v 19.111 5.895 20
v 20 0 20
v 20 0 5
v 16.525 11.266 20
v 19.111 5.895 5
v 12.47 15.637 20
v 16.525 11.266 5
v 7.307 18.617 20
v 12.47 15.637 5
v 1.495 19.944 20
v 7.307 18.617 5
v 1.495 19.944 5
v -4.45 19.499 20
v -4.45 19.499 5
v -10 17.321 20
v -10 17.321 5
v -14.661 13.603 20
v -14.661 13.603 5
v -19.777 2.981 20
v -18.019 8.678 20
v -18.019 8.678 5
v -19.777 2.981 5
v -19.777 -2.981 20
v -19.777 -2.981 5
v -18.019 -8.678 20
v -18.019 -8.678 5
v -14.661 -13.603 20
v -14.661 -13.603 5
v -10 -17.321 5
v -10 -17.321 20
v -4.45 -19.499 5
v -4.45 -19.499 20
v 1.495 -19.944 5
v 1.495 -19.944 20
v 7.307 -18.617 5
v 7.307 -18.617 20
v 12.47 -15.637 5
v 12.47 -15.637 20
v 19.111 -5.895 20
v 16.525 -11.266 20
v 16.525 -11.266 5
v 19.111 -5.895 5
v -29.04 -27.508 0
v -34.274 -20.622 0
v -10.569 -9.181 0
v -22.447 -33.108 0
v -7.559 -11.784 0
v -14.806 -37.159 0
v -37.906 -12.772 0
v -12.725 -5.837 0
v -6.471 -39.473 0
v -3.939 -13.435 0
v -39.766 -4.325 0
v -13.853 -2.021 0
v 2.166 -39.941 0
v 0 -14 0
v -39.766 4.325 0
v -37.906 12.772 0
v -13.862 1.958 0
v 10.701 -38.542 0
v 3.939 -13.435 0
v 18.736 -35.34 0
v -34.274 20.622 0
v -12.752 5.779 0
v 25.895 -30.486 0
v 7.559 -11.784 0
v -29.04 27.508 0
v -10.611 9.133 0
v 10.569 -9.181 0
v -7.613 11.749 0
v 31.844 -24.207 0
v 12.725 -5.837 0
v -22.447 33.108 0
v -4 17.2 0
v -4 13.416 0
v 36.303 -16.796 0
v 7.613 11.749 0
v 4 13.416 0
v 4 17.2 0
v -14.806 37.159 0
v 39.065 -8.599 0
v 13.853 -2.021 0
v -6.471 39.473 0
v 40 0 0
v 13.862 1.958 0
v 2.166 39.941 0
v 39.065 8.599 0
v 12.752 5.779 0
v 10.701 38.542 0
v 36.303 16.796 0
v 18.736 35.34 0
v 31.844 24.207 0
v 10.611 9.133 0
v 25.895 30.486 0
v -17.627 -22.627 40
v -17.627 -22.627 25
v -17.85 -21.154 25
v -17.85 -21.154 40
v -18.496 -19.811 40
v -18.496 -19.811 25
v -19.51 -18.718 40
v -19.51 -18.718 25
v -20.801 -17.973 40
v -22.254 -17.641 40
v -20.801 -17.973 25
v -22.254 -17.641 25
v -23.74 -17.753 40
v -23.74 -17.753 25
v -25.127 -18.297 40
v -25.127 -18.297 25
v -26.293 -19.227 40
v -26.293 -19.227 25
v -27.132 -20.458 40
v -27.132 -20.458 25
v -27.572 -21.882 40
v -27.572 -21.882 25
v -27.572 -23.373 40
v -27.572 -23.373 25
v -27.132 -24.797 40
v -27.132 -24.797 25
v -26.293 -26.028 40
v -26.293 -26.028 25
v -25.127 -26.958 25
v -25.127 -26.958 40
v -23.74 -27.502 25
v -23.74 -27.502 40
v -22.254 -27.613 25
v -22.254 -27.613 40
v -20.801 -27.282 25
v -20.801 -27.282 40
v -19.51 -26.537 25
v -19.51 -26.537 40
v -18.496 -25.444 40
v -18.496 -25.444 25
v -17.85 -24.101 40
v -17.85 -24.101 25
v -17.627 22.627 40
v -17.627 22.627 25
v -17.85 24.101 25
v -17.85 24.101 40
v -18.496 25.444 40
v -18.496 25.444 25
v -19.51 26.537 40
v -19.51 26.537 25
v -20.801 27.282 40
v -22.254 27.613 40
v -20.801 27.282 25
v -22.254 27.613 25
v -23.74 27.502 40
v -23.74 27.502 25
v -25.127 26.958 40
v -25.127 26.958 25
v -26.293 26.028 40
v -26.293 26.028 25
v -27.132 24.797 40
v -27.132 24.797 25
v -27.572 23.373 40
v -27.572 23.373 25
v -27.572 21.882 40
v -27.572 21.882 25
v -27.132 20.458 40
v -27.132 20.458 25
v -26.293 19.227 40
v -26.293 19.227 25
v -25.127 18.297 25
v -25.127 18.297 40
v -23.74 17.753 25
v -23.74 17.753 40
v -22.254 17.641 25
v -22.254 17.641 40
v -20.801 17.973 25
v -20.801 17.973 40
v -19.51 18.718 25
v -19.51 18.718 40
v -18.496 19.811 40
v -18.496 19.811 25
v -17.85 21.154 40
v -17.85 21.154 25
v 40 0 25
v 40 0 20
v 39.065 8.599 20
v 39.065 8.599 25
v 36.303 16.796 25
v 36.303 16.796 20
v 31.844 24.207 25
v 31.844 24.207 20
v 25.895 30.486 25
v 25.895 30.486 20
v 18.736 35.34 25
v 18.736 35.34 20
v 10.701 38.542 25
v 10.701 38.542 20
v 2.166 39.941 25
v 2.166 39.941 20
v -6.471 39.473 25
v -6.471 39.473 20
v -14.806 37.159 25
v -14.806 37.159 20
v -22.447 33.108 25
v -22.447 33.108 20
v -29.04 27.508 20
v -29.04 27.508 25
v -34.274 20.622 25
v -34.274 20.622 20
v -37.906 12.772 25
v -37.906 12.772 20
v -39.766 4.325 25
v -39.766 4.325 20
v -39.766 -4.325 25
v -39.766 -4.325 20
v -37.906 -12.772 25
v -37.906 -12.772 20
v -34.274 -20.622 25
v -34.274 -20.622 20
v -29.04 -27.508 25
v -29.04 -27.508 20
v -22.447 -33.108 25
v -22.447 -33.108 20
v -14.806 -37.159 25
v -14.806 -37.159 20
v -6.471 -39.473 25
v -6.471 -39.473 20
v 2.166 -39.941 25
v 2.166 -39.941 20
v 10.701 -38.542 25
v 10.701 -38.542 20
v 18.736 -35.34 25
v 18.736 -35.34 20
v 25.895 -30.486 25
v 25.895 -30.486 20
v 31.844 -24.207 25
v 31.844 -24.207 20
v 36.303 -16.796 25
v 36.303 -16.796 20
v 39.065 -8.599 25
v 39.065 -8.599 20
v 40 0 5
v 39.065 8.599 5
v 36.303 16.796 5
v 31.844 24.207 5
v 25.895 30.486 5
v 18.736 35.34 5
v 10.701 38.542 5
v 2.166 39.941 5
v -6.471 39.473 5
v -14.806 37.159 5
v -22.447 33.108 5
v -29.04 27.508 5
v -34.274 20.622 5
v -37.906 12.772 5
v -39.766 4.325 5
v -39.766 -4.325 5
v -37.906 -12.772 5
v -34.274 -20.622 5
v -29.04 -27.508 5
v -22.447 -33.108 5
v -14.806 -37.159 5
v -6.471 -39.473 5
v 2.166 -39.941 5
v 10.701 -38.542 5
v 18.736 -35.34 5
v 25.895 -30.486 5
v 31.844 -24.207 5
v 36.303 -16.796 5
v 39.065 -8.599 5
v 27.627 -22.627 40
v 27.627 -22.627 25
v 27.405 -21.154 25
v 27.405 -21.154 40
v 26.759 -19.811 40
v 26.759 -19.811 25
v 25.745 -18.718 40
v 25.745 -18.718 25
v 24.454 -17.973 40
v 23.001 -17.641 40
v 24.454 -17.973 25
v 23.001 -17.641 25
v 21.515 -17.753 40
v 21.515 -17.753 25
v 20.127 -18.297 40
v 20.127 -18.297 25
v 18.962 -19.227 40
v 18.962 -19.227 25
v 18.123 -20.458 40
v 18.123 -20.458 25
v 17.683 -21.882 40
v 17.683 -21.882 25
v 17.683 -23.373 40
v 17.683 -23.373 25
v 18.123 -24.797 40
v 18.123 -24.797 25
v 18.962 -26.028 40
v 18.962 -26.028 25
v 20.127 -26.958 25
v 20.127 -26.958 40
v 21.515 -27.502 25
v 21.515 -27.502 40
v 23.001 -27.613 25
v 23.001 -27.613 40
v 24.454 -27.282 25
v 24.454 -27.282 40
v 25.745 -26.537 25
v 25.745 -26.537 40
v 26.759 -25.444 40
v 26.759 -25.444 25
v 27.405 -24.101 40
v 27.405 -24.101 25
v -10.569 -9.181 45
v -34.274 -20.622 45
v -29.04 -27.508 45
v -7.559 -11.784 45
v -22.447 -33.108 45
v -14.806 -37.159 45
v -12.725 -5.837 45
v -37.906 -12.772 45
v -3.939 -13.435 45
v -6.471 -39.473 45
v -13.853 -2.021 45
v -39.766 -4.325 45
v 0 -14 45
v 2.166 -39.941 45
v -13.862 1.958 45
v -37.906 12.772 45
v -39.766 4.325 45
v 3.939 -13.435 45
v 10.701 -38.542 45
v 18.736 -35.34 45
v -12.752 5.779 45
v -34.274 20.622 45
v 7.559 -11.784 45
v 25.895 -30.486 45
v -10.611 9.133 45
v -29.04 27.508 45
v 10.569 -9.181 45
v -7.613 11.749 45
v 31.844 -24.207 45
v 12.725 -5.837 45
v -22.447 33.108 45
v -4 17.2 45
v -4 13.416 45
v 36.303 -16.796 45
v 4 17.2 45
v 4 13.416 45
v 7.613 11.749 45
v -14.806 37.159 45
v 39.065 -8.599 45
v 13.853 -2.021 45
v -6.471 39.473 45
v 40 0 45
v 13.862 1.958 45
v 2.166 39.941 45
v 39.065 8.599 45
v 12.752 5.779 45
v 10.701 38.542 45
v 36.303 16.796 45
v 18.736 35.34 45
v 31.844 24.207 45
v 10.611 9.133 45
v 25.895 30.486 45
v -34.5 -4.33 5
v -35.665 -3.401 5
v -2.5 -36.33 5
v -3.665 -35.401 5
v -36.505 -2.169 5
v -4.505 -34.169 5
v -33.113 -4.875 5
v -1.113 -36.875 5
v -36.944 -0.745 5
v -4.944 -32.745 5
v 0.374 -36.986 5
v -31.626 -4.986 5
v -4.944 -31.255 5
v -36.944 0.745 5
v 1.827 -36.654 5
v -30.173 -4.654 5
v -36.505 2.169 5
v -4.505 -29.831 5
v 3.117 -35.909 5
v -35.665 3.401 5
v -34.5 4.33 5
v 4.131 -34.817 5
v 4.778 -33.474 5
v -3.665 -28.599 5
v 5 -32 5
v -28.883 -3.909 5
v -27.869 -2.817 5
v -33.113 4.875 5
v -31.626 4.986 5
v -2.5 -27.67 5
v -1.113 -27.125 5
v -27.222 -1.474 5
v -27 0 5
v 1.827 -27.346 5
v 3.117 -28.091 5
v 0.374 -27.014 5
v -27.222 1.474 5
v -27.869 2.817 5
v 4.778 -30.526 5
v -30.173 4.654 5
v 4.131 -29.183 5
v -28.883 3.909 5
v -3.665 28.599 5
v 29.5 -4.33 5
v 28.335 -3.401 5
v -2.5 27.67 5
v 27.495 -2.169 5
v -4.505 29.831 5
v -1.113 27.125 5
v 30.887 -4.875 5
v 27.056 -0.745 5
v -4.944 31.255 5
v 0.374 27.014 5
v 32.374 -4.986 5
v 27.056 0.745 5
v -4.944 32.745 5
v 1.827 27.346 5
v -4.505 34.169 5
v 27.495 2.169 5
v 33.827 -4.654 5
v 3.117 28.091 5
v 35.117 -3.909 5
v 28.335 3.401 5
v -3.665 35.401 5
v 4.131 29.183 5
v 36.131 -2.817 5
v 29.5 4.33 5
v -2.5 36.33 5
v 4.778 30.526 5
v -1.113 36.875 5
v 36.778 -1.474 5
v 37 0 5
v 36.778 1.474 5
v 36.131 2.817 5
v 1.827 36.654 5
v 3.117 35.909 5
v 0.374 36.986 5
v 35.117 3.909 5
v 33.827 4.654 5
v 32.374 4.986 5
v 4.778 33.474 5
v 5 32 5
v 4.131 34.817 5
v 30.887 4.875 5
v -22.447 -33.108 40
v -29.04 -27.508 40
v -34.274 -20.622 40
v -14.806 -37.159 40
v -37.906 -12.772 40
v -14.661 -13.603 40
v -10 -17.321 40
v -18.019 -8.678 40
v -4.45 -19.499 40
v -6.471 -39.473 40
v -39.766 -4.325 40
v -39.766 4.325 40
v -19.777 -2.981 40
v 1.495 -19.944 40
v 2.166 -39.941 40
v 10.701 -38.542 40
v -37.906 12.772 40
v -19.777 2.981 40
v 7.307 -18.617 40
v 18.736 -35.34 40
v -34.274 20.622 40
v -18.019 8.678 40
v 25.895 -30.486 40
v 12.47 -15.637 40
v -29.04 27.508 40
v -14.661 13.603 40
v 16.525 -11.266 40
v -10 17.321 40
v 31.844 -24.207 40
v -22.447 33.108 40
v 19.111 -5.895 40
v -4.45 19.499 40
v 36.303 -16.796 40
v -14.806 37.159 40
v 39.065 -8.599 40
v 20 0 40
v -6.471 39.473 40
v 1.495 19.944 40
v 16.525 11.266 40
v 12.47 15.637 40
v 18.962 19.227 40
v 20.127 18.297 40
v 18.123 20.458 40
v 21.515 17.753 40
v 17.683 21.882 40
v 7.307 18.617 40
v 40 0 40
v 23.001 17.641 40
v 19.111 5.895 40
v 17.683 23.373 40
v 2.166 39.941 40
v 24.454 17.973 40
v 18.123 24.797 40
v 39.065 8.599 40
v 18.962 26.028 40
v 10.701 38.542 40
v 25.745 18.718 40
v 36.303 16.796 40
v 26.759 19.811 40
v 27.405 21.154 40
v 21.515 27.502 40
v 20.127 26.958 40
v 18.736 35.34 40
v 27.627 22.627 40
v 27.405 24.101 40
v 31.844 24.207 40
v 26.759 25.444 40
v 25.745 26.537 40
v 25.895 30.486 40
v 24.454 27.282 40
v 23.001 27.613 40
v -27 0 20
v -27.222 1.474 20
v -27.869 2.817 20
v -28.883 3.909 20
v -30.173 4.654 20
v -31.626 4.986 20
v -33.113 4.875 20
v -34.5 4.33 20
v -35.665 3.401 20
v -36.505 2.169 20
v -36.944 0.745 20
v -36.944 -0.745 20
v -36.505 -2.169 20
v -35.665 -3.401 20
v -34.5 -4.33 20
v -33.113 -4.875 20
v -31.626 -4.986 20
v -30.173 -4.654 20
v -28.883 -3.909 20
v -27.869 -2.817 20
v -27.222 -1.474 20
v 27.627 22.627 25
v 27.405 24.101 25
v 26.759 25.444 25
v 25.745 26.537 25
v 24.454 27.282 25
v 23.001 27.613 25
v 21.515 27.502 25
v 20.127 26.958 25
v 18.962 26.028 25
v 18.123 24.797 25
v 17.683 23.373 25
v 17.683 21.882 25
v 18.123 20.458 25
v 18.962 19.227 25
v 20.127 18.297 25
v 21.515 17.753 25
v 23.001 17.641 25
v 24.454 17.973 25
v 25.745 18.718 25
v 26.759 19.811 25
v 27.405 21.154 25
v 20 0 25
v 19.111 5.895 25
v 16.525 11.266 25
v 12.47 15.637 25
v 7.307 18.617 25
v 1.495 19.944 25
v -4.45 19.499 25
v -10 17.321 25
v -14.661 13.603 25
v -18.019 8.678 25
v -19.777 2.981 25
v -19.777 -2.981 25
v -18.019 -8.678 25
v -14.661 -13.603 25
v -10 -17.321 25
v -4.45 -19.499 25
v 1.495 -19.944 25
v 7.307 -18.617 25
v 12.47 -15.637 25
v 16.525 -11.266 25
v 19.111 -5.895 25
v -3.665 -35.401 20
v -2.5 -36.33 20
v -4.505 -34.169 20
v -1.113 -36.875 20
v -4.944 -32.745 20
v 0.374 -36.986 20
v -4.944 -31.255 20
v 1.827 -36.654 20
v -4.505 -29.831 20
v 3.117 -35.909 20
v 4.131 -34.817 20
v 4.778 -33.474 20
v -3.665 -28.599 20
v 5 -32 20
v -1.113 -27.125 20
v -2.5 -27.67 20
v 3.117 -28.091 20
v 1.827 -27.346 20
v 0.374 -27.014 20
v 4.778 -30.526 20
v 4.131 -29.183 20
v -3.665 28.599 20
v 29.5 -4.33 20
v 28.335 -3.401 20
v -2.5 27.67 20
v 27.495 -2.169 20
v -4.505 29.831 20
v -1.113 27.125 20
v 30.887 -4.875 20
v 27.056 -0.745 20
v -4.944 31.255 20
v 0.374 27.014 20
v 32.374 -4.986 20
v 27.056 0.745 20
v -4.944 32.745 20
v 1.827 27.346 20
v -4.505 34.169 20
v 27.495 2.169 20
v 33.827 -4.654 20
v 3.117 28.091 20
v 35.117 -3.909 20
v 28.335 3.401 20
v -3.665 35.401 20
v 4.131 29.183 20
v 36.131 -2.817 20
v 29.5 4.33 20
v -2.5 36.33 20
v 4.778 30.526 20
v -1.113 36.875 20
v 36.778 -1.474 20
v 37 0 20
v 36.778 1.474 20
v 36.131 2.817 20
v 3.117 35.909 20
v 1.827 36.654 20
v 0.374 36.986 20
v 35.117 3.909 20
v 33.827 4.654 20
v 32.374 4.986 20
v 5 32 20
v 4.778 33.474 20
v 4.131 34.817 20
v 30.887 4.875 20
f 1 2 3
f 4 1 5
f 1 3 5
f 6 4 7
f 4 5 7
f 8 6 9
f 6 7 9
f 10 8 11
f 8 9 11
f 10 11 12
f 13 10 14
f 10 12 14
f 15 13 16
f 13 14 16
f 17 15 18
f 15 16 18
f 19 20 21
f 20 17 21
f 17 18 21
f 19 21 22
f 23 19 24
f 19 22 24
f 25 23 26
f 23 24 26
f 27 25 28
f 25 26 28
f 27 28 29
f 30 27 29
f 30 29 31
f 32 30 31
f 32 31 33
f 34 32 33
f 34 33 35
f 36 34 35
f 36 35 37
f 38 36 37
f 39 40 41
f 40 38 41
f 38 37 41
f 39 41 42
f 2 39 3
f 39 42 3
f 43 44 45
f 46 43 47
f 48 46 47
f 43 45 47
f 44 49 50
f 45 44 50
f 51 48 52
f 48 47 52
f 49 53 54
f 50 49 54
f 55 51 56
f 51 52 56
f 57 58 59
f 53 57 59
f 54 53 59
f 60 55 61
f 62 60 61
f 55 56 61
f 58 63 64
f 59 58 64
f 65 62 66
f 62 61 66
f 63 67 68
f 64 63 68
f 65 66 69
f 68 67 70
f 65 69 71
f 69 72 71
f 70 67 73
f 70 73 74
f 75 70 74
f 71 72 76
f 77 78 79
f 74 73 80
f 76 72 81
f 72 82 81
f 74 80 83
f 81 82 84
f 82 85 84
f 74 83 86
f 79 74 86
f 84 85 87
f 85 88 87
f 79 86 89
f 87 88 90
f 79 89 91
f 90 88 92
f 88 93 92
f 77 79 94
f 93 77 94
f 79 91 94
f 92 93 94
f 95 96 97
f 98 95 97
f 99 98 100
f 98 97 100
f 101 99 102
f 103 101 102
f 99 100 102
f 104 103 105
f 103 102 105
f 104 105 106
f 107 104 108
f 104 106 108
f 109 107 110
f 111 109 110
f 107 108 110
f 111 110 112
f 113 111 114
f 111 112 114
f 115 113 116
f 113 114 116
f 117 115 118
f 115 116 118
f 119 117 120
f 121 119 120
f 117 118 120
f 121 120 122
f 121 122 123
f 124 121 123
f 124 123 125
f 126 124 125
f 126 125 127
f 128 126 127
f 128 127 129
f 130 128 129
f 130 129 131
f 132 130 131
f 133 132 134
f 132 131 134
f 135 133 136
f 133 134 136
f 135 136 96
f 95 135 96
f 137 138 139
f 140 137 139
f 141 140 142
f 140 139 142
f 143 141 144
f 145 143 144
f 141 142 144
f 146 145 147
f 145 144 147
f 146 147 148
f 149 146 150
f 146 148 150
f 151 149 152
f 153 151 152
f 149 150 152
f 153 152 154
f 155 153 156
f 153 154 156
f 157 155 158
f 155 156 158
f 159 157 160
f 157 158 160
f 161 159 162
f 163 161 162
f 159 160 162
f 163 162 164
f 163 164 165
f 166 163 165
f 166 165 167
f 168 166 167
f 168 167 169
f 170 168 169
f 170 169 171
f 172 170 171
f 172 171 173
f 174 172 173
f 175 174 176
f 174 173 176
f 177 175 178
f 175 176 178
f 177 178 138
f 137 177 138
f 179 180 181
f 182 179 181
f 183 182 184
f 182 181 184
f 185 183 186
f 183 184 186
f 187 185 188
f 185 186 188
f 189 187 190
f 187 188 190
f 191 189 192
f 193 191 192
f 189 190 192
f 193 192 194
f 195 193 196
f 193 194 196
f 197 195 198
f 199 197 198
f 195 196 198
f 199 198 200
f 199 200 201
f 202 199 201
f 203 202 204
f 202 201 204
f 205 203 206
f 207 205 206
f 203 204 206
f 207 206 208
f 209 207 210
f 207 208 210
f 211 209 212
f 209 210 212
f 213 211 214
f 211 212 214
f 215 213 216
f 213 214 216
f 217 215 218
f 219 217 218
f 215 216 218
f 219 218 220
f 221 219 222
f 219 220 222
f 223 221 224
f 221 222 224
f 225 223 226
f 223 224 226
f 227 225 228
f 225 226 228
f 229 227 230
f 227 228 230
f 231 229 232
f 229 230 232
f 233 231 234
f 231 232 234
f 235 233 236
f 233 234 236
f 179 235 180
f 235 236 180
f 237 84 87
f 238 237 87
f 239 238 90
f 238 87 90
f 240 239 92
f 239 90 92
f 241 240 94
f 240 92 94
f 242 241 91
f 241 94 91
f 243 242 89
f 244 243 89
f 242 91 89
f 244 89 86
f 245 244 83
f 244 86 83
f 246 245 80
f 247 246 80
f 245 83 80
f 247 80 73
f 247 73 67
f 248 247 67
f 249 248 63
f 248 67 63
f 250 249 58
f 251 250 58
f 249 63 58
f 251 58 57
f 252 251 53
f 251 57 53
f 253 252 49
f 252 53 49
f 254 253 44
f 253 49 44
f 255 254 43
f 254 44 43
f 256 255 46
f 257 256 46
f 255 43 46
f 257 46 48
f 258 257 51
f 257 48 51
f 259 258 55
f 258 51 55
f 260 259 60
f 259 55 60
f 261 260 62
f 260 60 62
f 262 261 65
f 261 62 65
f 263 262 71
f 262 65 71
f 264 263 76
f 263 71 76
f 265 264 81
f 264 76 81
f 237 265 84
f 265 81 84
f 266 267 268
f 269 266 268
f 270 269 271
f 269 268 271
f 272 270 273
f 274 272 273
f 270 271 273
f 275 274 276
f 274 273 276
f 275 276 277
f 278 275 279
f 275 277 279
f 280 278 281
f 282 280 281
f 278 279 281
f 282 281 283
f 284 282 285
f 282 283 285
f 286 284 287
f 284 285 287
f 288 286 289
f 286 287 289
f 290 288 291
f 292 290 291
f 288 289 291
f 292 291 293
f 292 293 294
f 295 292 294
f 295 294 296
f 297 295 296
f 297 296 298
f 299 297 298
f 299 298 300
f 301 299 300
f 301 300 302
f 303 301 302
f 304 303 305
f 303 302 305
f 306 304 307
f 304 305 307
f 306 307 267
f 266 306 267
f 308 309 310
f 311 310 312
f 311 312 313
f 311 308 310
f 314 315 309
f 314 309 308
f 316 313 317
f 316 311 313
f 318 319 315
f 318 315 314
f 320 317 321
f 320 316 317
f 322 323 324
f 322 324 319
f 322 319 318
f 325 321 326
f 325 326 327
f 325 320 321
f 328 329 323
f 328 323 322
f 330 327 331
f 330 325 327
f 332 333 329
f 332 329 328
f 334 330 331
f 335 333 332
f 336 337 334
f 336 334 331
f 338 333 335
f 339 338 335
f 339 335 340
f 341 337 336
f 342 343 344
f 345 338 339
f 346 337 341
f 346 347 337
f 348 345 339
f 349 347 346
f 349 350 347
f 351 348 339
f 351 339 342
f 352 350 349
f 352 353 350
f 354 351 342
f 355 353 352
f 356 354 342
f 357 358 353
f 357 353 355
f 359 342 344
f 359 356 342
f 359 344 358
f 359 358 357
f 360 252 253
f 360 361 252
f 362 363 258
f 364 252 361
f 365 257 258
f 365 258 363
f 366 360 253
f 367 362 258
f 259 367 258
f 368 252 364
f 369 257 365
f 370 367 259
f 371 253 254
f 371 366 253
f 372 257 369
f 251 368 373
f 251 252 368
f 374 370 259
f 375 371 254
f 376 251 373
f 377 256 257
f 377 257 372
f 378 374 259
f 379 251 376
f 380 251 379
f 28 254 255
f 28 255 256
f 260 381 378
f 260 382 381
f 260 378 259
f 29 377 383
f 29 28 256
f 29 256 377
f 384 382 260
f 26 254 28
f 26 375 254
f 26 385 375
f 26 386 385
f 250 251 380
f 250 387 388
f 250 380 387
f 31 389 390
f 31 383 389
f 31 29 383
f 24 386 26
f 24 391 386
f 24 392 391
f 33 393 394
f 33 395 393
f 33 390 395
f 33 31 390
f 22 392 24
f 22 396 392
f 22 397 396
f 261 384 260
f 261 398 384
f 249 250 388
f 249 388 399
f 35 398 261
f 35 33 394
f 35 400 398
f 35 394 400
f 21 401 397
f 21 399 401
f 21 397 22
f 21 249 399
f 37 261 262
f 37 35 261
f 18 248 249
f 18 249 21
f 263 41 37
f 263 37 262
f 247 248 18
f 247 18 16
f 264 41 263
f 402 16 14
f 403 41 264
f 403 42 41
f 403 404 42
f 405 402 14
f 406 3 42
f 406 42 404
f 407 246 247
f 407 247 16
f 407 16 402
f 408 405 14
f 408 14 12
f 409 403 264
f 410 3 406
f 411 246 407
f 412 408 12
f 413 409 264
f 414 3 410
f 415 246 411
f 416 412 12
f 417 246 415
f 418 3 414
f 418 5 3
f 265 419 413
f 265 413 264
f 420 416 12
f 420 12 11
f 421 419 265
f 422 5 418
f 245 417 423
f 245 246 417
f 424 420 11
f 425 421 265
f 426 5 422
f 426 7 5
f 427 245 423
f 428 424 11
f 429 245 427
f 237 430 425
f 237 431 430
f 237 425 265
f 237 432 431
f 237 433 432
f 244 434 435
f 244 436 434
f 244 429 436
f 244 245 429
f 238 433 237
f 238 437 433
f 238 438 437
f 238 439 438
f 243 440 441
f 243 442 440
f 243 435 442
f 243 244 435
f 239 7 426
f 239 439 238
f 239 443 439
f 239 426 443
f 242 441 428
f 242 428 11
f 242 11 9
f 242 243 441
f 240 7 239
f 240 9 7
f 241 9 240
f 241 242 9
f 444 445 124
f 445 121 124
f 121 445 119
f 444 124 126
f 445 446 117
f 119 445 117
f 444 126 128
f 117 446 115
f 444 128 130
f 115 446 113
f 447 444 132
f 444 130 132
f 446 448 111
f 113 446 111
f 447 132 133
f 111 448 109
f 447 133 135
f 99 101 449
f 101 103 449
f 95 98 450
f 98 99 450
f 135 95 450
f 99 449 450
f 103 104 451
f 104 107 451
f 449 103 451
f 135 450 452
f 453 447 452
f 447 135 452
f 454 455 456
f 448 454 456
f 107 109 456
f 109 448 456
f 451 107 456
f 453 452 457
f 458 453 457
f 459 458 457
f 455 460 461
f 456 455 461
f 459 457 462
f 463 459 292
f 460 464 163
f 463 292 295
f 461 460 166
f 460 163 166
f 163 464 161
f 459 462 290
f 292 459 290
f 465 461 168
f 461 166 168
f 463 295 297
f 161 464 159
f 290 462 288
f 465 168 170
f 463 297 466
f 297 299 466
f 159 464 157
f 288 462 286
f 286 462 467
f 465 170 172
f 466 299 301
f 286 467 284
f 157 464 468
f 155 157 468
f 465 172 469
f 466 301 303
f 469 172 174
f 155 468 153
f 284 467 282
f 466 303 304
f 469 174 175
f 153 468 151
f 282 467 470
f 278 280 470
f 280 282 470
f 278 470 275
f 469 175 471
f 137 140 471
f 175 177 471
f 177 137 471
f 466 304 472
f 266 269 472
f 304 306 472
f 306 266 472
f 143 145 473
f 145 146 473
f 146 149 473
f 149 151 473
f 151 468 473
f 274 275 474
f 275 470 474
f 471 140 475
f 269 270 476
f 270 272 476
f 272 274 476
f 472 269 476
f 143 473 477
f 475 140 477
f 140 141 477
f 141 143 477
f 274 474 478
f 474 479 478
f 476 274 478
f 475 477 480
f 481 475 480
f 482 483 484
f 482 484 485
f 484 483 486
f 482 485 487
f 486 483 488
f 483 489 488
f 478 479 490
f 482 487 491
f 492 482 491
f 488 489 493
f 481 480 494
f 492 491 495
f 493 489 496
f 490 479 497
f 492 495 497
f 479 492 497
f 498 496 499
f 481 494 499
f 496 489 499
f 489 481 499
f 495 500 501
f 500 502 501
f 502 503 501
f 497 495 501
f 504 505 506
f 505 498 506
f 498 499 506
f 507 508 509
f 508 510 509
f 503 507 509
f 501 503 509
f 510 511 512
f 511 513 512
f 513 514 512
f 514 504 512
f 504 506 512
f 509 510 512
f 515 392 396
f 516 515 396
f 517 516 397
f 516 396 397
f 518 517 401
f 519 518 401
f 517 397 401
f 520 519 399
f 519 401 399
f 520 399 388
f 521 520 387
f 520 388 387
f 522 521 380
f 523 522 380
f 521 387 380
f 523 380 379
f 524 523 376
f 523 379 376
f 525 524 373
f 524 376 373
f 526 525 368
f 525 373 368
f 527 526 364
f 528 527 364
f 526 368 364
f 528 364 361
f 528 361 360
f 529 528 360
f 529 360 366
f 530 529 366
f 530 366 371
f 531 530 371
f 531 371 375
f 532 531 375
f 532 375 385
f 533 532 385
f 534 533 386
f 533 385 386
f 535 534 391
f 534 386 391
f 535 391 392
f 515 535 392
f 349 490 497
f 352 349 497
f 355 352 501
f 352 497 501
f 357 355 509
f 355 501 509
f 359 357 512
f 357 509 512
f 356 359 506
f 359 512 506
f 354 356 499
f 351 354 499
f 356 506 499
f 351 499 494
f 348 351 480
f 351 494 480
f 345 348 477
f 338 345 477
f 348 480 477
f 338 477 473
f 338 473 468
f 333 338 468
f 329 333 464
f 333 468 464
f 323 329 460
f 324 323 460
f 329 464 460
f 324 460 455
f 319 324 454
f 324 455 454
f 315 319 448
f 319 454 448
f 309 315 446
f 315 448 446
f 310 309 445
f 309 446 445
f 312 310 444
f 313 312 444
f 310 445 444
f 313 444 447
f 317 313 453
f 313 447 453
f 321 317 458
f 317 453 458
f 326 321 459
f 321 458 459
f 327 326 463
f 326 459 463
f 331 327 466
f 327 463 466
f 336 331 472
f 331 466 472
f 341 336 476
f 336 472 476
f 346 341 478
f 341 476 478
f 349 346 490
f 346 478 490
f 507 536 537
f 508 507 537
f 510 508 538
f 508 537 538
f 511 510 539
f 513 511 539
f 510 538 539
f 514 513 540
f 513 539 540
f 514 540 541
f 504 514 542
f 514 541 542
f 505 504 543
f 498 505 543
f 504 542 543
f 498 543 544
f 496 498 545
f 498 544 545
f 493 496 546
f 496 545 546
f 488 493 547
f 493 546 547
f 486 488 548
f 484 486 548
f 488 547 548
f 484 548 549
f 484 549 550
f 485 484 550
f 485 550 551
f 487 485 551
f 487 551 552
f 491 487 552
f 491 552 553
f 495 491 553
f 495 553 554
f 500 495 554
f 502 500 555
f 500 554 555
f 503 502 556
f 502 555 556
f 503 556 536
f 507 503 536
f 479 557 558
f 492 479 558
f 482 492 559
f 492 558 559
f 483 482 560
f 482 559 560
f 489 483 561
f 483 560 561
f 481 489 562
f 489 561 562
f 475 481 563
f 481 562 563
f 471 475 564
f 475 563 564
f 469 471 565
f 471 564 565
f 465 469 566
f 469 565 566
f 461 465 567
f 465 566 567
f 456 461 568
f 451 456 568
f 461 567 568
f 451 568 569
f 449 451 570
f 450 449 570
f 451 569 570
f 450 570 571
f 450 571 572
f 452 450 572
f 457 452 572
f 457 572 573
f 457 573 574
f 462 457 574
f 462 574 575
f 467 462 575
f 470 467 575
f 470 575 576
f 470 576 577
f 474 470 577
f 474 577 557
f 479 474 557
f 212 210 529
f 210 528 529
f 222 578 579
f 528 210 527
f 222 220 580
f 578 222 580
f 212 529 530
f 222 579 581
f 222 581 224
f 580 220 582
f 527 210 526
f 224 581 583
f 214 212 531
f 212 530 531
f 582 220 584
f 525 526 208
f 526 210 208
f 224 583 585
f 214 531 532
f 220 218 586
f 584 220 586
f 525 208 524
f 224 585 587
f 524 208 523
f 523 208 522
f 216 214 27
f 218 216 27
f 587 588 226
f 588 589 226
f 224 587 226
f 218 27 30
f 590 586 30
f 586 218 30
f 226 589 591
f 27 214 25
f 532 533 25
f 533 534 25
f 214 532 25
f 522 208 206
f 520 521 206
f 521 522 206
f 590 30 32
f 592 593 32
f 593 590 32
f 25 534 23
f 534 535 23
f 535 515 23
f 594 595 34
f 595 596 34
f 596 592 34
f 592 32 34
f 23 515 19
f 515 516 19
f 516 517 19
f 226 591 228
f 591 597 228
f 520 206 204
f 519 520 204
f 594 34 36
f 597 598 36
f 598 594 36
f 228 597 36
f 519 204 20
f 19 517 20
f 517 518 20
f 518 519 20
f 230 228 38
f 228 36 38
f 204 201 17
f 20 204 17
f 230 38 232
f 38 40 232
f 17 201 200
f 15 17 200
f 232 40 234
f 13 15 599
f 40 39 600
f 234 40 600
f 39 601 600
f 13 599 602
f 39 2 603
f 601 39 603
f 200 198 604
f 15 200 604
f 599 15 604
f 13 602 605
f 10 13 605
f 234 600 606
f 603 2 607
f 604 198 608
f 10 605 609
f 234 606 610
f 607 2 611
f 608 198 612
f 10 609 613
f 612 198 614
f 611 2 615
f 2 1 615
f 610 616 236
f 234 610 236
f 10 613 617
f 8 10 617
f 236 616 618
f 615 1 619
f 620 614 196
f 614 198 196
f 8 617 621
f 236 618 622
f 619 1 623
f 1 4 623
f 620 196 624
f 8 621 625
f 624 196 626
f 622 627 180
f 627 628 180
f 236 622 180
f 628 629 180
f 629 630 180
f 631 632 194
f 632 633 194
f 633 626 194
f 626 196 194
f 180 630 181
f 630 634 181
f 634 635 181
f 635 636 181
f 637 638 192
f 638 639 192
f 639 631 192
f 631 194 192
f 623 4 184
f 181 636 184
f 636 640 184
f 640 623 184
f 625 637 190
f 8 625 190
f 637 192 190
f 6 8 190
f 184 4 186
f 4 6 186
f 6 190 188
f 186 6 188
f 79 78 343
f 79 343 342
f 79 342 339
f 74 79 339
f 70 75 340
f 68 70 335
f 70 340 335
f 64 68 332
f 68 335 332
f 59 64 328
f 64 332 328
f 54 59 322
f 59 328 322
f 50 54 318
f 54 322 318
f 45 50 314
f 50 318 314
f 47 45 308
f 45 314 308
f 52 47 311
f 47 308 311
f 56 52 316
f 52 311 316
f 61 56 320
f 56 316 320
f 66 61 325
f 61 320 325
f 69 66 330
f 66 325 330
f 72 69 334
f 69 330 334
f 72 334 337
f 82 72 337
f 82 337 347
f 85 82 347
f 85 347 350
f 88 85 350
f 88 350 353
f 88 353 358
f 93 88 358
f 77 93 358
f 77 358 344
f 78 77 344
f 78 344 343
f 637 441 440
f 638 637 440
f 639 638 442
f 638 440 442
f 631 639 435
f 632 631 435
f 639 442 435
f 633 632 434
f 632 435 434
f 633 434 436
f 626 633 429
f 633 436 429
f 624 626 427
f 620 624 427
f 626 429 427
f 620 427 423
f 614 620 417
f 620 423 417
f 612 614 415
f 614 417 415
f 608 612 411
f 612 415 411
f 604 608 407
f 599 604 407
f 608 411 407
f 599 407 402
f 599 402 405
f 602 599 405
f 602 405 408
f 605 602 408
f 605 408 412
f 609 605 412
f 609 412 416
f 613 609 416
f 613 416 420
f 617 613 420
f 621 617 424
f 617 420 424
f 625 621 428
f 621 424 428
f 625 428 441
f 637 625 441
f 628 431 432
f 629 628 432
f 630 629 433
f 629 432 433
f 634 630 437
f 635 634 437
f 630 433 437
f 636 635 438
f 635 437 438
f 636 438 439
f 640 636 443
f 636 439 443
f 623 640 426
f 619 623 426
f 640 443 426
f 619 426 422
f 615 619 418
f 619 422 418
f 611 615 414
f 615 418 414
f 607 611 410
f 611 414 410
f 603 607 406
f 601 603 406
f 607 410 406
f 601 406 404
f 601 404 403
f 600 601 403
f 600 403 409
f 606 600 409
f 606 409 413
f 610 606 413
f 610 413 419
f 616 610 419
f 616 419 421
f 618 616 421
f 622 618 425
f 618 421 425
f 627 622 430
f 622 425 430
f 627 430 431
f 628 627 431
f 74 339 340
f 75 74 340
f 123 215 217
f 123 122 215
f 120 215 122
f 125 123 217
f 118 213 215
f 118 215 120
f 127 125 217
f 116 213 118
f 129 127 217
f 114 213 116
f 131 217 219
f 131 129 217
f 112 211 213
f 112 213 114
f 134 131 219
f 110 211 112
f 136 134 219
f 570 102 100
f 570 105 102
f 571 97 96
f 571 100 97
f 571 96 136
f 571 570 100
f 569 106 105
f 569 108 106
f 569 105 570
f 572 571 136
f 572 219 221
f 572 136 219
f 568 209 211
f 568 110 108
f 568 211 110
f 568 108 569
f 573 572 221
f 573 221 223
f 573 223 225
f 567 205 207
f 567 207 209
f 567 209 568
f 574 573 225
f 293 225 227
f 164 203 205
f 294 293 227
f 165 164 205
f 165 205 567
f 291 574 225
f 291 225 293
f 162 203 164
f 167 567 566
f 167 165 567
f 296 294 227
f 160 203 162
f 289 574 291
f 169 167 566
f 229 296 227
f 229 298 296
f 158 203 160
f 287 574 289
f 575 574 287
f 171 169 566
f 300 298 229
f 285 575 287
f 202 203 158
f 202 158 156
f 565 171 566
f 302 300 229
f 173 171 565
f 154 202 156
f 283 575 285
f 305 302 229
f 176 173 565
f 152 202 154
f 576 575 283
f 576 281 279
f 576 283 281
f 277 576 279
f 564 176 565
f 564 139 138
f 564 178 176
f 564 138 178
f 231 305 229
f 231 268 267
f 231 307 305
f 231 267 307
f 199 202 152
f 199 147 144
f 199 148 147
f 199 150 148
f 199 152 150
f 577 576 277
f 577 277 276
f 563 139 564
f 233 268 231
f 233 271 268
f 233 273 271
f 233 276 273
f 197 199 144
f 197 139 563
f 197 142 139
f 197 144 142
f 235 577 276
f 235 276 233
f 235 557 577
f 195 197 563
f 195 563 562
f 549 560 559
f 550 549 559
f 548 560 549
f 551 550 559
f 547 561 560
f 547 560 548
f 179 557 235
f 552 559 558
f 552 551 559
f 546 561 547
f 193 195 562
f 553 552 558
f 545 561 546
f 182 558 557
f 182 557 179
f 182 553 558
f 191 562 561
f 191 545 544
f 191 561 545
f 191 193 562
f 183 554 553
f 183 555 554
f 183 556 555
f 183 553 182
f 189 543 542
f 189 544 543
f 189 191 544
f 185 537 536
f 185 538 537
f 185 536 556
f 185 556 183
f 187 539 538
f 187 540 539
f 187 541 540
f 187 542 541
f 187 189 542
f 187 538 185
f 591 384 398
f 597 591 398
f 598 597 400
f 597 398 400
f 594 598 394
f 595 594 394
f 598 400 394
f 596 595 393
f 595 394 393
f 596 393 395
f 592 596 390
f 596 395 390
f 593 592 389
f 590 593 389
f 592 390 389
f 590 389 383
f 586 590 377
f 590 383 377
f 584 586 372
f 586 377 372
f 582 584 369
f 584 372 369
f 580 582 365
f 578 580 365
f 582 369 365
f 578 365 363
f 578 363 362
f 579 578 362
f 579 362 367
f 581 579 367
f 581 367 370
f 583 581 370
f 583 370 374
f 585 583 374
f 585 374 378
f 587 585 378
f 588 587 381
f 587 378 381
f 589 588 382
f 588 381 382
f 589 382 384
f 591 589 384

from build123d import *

# Parameters (mm, degrees)
SKETCH_1_R          = 40
EXTRUDE_1_DEPTH     = 5
SKETCH_2_R          = 5
EXTRUDE_2_DEPTH     = 15
SKETCH_3_R          = 40
EXTRUDE_3_DEPTH     = 5
SKETCH_4_R          = 5
EXTRUDE_4_DEPTH     = 15
SKETCH_5_R          = 40
EXTRUDE_5_DEPTH     = 5
SKETCH_6_R          = 20
EXTRUDE_6_DEPTH     = 35
SKETCH_7_R          = 14
CUT_EXTRUDE_1_DEPTH = 57
CUT_EXTRUDE_2_DEPTH = 57


with BuildPart() as part:
    # 草图1 → 凸台-拉伸1 (new body)
    with BuildSketch(Plane.XY):
        Circle(SKETCH_1_R)
    extrude(amount=EXTRUDE_1_DEPTH)

    # 草图2 → 凸台-拉伸2 (add)
    with BuildSketch(Plane.XY.offset(5)):
        with Locations((32, 0)):
            Circle(SKETCH_2_R)
        with Locations((0, -32)):
            Circle(SKETCH_2_R)
        with Locations((-32, 0)):
            Circle(SKETCH_2_R)
        with Locations((0, 32)):
            Circle(SKETCH_2_R)
    extrude(amount=EXTRUDE_2_DEPTH)

    # 草图3 → 凸台-拉伸3 (add)
    with BuildSketch(Plane.XY.offset(20)):
        Circle(SKETCH_3_R)
    extrude(amount=EXTRUDE_3_DEPTH)

    # 草图4 → 凸台-拉伸4 (add)
    with BuildSketch(Plane.XY.offset(25)):
        with Locations((22.627416998, -22.627416998)):
            Circle(SKETCH_4_R)
        with Locations((-22.627416998, -22.627416998)):
            Circle(SKETCH_4_R)
        with Locations((-22.627416998, 22.627416998)):
            Circle(SKETCH_4_R)
        with Locations((22.627416998, 22.627416998)):
            Circle(SKETCH_4_R)
    extrude(amount=EXTRUDE_4_DEPTH)

    # 草图5 → 凸台-拉伸5 (add)
    with BuildSketch(Plane.XY.offset(40)):
        Circle(SKETCH_5_R)
    extrude(amount=EXTRUDE_5_DEPTH)

    # 草图6 → 凸台-拉伸6 (add)
    with BuildSketch(Plane.XY.offset(5)):
        Circle(SKETCH_6_R)
    extrude(amount=EXTRUDE_6_DEPTH)

    # 草图7 → 切除-拉伸1 (cut)
    with BuildSketch(Plane.XY.offset(45)):
        Circle(SKETCH_7_R)
    extrude(amount=-CUT_EXTRUDE_1_DEPTH, mode=Mode.SUBTRACT)

    # 草图8 → 切除-拉伸2 (cut)
    with BuildSketch(Plane.XY.offset(45)):
        Polygon((-4, 14), (-4, 9.394877301), (4, 9.394877301), (4, 14), (4, 17.2), (-4, 17.2), align=None)
    extrude(amount=-CUT_EXTRUDE_2_DEPTH, mode=Mode.SUBTRACT)


solid = part.part
